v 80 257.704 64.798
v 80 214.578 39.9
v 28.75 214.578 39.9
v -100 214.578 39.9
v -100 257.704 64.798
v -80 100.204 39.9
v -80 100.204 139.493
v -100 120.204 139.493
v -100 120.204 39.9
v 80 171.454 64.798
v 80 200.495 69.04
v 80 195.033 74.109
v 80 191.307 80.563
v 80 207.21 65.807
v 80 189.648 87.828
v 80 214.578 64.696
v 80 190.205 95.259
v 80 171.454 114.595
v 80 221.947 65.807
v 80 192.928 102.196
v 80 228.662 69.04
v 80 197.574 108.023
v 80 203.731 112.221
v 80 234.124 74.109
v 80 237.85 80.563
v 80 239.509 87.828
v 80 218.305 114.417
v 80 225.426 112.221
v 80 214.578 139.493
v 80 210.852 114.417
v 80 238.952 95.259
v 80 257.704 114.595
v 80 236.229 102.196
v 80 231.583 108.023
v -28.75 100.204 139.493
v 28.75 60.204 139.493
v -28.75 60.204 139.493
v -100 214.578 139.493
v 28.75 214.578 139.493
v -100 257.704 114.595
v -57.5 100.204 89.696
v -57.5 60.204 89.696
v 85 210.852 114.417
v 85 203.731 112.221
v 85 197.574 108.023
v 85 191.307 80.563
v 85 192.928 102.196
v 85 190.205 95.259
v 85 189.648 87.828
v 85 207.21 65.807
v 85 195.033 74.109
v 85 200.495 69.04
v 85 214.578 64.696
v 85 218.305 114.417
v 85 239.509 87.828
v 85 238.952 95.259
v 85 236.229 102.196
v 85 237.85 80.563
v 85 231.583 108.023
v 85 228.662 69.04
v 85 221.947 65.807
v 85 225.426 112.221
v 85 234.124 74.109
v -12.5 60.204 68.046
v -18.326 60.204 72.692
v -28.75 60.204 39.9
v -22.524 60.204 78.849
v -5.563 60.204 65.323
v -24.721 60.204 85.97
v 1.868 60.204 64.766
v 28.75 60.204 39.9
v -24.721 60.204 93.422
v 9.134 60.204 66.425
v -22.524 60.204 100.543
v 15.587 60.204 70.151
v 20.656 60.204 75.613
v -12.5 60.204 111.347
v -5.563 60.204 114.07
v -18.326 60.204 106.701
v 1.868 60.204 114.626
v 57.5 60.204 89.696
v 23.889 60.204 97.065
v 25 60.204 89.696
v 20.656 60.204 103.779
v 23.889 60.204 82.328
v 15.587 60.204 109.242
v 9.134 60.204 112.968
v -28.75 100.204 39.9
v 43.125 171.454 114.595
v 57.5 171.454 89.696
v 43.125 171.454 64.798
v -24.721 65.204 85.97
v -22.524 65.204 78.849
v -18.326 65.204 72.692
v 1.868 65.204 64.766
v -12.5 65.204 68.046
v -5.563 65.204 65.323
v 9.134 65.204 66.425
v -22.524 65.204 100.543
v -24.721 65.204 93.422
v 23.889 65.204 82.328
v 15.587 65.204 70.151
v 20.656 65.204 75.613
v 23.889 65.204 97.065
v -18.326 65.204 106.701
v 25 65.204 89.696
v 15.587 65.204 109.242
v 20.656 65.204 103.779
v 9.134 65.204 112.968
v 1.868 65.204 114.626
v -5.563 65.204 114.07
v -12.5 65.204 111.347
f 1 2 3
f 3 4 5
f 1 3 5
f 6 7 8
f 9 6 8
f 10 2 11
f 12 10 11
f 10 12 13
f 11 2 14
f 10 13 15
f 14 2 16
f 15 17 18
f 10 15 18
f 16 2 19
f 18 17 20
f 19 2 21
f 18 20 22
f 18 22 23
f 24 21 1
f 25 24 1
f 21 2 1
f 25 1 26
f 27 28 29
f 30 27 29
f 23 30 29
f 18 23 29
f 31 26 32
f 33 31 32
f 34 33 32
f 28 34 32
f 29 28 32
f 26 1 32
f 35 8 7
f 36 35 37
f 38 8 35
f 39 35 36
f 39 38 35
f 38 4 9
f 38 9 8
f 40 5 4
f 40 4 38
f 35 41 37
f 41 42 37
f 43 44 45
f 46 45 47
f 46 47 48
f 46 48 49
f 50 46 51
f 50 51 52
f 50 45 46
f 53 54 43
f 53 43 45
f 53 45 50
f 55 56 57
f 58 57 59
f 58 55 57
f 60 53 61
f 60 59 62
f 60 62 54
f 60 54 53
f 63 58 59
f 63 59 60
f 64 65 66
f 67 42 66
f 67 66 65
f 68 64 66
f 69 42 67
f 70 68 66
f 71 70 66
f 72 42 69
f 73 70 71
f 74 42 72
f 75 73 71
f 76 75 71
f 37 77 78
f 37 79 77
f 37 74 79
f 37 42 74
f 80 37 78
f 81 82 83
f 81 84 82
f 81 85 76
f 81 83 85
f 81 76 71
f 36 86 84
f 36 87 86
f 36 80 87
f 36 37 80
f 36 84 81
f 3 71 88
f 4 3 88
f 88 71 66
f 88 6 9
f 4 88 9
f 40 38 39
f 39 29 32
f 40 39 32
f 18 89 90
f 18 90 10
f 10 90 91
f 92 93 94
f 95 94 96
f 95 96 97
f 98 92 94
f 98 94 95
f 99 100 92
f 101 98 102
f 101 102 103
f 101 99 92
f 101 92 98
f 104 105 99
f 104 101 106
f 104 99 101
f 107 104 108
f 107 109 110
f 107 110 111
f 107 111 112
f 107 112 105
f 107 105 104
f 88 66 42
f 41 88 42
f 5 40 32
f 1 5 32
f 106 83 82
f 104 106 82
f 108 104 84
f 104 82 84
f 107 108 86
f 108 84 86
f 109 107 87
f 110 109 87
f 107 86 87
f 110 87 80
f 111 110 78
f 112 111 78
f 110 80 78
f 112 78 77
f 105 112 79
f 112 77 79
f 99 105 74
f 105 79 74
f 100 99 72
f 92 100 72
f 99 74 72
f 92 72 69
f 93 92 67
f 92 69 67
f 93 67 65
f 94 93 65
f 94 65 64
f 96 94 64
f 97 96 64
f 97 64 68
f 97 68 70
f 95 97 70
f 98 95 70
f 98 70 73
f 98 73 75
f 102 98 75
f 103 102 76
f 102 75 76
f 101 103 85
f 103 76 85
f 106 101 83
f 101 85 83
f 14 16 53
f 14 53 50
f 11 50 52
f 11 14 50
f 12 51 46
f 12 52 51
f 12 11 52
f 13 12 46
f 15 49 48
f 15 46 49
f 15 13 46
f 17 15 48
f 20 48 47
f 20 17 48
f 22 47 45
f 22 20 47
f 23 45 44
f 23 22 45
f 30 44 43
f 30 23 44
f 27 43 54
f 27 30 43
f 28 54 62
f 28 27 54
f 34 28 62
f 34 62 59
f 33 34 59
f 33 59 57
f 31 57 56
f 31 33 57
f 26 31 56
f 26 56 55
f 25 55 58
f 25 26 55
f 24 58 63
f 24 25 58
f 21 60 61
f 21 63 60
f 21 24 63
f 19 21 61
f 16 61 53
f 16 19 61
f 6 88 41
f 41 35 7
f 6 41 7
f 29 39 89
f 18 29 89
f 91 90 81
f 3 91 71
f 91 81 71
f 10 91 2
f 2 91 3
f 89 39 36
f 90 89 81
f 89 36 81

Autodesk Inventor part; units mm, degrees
ref_plane "YZ Plane" through (0, 0, 0) normal (1, 0, 0) x (0, 1, 0)
ref_plane "XZ Plane" through (0, 0, 0) normal (0, 1, 0) x (-1, 0, 0)
ref_plane "XY Plane" through (0, 0, 0) normal (0, 0, 1) x (1, 0, 0)
sketch "Sketch1" plane through (0, 0, 0) normal (0, 0, 1) x (1, 0, 0)
  line L0 (57.5, 0) -> (28.75, -49.7965)
  line L1 (28.75, -49.7965) -> (-28.75, -49.7965)
  line L2 (-28.75, -49.7965) -> (-57.5, 0)
  line L3 (-57.5, 0) -> (-28.75, 49.7965)
  line L4 (-28.75, 49.7965) -> (28.75, 49.7965)
  line L5 (28.75, 49.7965) -> (57.5, 0)
  point P0 (0, 0)
  point P1 (0, 0)
  dimension "d0" = 115
extrude "Extrusion1" add sketch "Sketch1" along normal blind 139.4929
sketch "Sketch2" plane through (-28.75, -49.7965, 0) normal (0, -1, 0) x (1, 0, 0)
  line L0 (-28.75, 89.6965) -> (0, 139.4929)
  line L1 (0, 139.4929) -> (57.5, 139.4929)
  line L2 (57.5, 139.4929) -> (86.25, 89.6965)
  line L3 (86.25, 89.6965) -> (57.5, 39.9)
  line L4 (57.5, 39.9) -> (0, 39.9)
  line L5 (0, 39.9) -> (-28.75, 89.6965)
  line L6 (0, 139.4929) -> (57.5, 139.4929) projected
  point P0 (28.75, 0)
  point P1 (28.75, 89.6965)
  point P2 (28.75, 139.4929)
  dimension "d3" = 115
extrude "Extrusion2" add sketch "Sketch2" against normal blind 307.5
sketch "Sketch3" plane through (0, 0, 139.4929) normal (0, 0, 1) x (1, 0, 0)
  line L0 (-28.75, 49.7965) -> (-28.75, 257.7035) projected
  line L1 (-28.75, 100.2035) -> (-100, 100.2035)
  line L2 (-100, 100.2035) -> (-100, 257.7035)
  line L3 (-57.5, 257.7035) -> (-28.75, 257.7035) projected
  line L4 (-100, 257.7035) -> (-28.75, 257.7035)
  line L5 (-80, 100.2035) -> (-100, 120.2035)
  point P0 (0, 0)
  dimension "d6" = 71.25
  dimension "d7" = 157.5
  dimension "d8" = 28.2843
  dimension "d9" = 45
extrude "Extrusion3" add sketch "Sketch3" against normal blind 99.5929 contours L1 L5 L2 L4 L3 L0
sketch "Sketch4" plane through (-100, 120.2035, 139.4929) normal (-1, 0, 0) x (0, 0, 1)
  line L0 (-99.5929, 94.375) -> (-74.6947, 137.5)
  line L1 (-74.6947, 137.5) -> (-24.8982, 137.5)
  line L2 (-24.8982, 137.5) -> (0, 94.375)
  line L3 (0, 94.375) -> (-24.8982, 51.25)
  line L4 (-24.8982, 51.25) -> (-74.6947, 51.25)
  line L5 (-74.6947, 51.25) -> (-99.5929, 94.375)
  line L6 (0, 137.5) -> (-99.5929, 137.5) projected
  line L7 (0, 137.5) -> (0, 0) projected
  line L8 (-99.5929, 0) -> (-99.5929, 137.5) projected
  point P0 (-139.4929, -120.2035)
  point P1 (-49.7965, 94.375)
  point P2 (-49.7965, 137.5)
extrude "Extrusion4" add sketch "Sketch4" against normal blind 180 contours L0 L1 L2 L3 L4 L5
sketch "Sketch6" plane through (80, 120.2035, 139.4929) normal (1, 0, 0) x (0, 0, -1)
  line L0 (0, 94.375) -> (24.8982, 137.5) projected
  line L1 (0, 137.5) -> (24.8982, 137.5) projected
  line L2 (0, 94.375) -> (0, 137.5) projected
  line L3 (74.6947, 137.5) -> (99.5929, 94.375) projected
  line L4 (99.5929, 94.375) -> (99.5929, 137.5) projected
  line L5 (74.6947, 137.5) -> (99.5929, 137.5) projected
  line L6 (49.7965, -120.2035) -> (99.5929, -170) projected
  line L7 (49.7965, -170) -> (49.7965, -120.2035) projected
  line L8 (99.5929, -170) -> (49.7965, -170) projected
  line L9 (0, -170) -> (49.7965, -120.2035) projected
  line L10 (49.7965, -170) -> (0, -170) projected
  line L11 (49.7965, -170) -> (49.7965, -120.2035) projected
  line L12 (0, -170) -> (49.7965, -120.2035) projected
  line L13 (49.7965, -120.2035) -> (0, -120.2035) projected
  line L14 (0, -170) -> (0, -120.2035) projected
  line L15 (49.7965, -120.2035) -> (0, -70.4071) projected
  line L16 (0, -120.2035) -> (0, -70.4071) projected
  line L17 (49.7965, -120.2035) -> (0, -120.2035) projected
  point P0 (139.4929, -120.2035)
extrude "Extrusion5" cut sketch "Sketch6" against normal through all
sketch "Sketch7" plane through (0, 0, 0) normal (0, 0, -1) x (-1, 0, 0)
  circle A0 centre (0, 0) radius 25
  dimension "d16" = 50
extrude "Extrusion6" cut sketch "Sketch7" against normal blind 5
sketch "Sketch8" plane through (80, 120.2035, 139.4929) normal (1, 0, 0) x (0, 0, -1)
  line L0 (74.6947, 51.25) -> (99.5929, 94.375) projected
  line L1 (99.5929, 94.375) -> (74.6947, 137.5) projected
  line L2 (74.6947, 137.5) -> (24.8982, 137.5) projected
  line L3 (24.8982, 137.5) -> (0, 94.375) projected
  line L4 (0, 94.375) -> (24.8982, 51.25) projected
  line L5 (24.8982, 51.25) -> (74.6947, 51.25) projected
  circle A0 centre (49.7965, 94.375) radius 25
  point P0 (139.4929, -120.2035)
  point P1 (49.7965, 137.5)
  dimension "d19" = 50
extrude "Extrusion7" add sketch "Sketch8" along normal blind 5 contours A0
sketch "Sketch9" plane through (0, 0, 139.4929) normal (0, 0, 1) x (1, 0, 0)
  line L0 (-57.5, 0) -> (-57.5, 100.2035) projected
  line L1 (-57.5, 60.2035) -> (57.5, 60.2035)
  line L2 (57.5, 60.2035) -> (57.5, -49.7965)
  line L3 (57.5, -49.7965) -> (-57.5, -49.7965)
  line L4 (-57.5, -49.7965) -> (-57.5, 60.2035)
  line L5 (57.5, 0) -> (57.5, 171.4535) projected
  line L6 (28.75, -49.7965) -> (-28.75, -49.7965) projected
  line L7 (-80, 100.2035) -> (-28.75, 100.2035) projected
  point P0 (0, 0)
  point P1 (0, -49.7965)
  dimension "d22" = 40
extrude "Extrusion8" cut sketch "Sketch9" against normal through all
sketch "Sketch10" plane through (-28.75, 60.2035, 139.4929) normal (0, -1, 0) x (1, 0, 0)
  line L0 (57.5, 0) -> (86.25, -49.7965) projected
  line L1 (0, 0) -> (57.5, 0) projected
  line L2 (-28.75, -49.7965) -> (0, 0) projected
  line L3 (0, -99.5929) -> (-28.75, -49.7965) projected
  line L4 (57.5, -99.5929) -> (0, -99.5929) projected
  line L5 (86.25, -49.7965) -> (57.5, -99.5929) projected
  circle A0 centre (28.75, -49.7965) radius 25
  point P0 (28.75, -139.4929)
  point P1 (28.75, 0)
  dimension "d25" = 50
extrude "Extrusion9" cut sketch "Sketch10" against normal blind 5 contours A0
properties part number "link_a0" material "ABS Plastic"
